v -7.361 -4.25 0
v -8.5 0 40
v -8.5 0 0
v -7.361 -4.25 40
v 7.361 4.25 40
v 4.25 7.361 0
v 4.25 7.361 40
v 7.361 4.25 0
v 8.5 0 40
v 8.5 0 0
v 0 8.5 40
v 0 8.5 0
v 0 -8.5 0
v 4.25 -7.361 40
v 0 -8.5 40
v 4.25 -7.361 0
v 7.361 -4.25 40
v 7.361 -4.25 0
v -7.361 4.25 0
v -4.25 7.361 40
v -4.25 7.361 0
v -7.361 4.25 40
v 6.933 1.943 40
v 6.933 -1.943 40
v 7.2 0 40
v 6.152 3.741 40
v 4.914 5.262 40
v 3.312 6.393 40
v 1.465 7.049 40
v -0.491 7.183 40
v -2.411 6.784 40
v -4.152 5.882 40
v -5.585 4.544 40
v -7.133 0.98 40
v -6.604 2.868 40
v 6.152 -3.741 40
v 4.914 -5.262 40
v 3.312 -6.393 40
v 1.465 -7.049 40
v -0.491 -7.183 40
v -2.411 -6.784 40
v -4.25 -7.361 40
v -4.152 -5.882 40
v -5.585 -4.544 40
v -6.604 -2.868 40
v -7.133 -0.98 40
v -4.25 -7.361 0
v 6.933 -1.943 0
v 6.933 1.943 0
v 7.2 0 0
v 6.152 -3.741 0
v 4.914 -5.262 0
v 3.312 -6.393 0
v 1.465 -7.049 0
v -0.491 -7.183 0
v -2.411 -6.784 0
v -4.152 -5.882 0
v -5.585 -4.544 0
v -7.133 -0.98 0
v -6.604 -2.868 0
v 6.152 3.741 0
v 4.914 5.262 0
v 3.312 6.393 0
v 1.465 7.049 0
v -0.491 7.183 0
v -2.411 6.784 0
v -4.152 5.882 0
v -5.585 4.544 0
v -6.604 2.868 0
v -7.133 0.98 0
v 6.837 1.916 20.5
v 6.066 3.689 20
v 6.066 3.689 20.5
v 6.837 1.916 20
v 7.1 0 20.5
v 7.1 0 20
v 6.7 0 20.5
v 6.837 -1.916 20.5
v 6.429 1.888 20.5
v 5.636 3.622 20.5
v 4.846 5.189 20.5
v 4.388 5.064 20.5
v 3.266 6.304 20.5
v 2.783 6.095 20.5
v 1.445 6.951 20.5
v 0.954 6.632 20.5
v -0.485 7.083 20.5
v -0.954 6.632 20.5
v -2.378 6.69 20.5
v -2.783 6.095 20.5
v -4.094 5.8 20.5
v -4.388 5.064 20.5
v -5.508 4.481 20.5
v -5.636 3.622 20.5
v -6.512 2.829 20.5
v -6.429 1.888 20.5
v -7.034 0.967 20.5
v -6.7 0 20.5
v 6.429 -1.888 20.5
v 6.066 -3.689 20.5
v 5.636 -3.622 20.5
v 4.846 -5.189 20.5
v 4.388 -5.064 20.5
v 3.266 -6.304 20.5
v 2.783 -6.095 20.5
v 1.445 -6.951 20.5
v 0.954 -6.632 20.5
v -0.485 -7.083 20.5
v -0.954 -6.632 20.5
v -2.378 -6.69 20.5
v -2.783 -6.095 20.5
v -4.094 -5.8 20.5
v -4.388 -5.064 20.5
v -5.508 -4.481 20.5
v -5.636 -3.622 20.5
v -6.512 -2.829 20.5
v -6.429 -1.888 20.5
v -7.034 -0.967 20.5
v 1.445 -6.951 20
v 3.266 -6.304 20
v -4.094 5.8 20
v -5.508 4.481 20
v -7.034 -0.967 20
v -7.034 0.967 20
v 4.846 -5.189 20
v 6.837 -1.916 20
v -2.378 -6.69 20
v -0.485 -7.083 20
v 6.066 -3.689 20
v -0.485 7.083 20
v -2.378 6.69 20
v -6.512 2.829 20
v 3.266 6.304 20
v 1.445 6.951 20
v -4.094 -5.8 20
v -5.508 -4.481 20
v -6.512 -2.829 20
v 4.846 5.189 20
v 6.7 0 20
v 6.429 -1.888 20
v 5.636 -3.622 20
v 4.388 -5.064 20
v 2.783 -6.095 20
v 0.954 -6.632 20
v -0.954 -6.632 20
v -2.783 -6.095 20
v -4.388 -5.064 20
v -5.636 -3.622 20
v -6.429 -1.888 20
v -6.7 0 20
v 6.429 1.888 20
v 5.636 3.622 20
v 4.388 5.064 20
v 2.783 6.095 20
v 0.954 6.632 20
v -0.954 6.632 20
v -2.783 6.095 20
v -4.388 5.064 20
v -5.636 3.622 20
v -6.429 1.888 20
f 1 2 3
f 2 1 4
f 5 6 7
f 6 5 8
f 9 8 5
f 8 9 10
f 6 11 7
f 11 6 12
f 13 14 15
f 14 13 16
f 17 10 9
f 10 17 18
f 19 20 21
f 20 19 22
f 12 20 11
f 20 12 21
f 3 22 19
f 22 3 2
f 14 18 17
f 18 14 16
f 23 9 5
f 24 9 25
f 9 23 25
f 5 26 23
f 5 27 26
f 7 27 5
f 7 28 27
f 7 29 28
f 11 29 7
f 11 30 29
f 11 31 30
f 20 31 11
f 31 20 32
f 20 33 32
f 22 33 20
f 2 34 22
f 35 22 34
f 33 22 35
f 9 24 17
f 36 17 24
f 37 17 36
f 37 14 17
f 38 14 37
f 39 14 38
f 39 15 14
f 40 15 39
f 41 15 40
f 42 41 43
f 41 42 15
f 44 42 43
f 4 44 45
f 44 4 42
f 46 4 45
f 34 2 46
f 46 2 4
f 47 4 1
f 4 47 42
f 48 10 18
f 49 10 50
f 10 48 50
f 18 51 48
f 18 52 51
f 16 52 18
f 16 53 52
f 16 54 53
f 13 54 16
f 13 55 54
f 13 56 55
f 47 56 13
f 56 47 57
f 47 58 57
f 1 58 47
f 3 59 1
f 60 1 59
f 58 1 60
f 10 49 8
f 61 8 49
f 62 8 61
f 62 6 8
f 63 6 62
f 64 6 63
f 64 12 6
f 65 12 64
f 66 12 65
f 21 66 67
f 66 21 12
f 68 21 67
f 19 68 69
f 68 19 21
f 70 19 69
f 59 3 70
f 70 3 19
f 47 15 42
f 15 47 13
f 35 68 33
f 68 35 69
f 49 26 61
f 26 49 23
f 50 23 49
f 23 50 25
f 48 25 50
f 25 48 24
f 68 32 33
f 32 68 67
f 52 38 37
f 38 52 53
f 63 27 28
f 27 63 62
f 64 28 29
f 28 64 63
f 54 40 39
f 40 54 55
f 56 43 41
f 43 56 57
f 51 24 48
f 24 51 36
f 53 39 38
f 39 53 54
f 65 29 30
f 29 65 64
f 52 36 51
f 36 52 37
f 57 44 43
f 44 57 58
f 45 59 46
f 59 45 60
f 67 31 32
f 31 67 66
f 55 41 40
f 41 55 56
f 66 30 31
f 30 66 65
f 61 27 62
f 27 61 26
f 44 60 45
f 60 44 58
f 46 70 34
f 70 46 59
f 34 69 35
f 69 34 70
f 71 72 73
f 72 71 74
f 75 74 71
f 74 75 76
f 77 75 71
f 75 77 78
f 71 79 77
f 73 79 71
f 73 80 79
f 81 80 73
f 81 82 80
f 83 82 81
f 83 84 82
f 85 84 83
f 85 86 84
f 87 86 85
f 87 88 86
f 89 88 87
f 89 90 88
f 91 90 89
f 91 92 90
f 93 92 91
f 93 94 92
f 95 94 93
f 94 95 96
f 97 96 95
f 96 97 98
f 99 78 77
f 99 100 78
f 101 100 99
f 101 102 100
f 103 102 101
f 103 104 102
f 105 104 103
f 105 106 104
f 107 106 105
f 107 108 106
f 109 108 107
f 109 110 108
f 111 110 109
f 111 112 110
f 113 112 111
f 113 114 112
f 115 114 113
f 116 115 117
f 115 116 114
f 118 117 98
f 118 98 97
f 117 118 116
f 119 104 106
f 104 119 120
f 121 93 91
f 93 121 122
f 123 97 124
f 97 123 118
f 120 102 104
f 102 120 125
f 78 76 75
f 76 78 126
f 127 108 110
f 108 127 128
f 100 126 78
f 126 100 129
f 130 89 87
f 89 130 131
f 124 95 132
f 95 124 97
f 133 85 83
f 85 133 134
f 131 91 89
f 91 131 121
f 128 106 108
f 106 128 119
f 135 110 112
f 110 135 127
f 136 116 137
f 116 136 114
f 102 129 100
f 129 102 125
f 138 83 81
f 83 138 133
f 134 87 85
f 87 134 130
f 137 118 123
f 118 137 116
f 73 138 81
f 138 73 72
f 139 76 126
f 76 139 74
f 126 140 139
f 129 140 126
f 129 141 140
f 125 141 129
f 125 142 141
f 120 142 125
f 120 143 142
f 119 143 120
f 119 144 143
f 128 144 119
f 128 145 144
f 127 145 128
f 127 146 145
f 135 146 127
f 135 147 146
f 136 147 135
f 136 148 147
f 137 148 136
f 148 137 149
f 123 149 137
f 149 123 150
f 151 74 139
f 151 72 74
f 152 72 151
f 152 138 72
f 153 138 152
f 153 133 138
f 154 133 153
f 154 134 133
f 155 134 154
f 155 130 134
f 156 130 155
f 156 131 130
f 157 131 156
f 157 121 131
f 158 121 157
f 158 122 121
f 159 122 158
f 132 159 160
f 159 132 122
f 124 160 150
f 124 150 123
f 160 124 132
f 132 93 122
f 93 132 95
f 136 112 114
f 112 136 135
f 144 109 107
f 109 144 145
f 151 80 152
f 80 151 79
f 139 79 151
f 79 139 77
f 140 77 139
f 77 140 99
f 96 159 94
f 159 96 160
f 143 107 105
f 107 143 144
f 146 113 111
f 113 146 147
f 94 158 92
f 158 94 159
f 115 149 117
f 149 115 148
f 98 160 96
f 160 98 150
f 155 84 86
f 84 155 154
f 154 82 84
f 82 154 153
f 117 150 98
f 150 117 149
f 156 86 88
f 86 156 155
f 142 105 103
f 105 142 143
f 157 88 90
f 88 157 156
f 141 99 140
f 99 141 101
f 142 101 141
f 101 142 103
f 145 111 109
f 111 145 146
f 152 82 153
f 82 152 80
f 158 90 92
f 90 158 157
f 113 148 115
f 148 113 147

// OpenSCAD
//Manschette
height=40;
gap=0.2;
inner_diameter=14.2;   // fits perfectly with minimum clearance
outer_diameter=17;

//Arretier-Ring
height_ring=0.5;
width_ring=0.8;
position_ring=height/2;

//Manschette
difference() {
    cylinder(r=outer_diameter/2,h=height,$fn=12);
    translate([0,0,-1]) {
        cylinder(r=(inner_diameter+gap)/2,h=(height+2));
    };
}

//Arretier-Ring
translate([0,0,position_ring]) {
    difference() {
        cylinder(r=inner_diameter/2, h=height_ring);
        translate([0,0,-1]) {
            cylinder(r=(inner_diameter-width_ring)/2,h=height_ring+2);
        };
    }
}
